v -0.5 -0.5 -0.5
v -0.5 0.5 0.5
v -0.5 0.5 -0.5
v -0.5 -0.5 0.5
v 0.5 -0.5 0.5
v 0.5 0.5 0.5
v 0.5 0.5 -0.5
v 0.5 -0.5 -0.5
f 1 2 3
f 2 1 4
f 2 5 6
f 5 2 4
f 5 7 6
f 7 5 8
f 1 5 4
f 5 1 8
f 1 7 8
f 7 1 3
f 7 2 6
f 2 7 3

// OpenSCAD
// file: polychannel.scad
module shape3D(size, position, center=true) {
    translate(position) cube(size, center=center);
}

// See https://forum.openscad.org/Calculating-Summarize-Arrays-generate-Array-td29132.html
function partial_sum(v, n, r = 0) = n <= 0 
        ? r + v[0] 
        : partial_sum(v, n - 1, r + v[n]); 

function partial_sum_vectors(v, n, r = [0,0,0]) = partial_sum(v, n, r); 

/*
// Tests for partial_sum and partial_sum_vectors
dim = [10, 8, 2, 25, 5]; 
n = len(dim); 
x_pos = [for(i = [0:n-1]) partial_sum(dim, i)]; 
echo(x_pos); // ECHO: [10, 18, 20, 45, 50] 
echo("");
dim2 = [[10, 1], [8, 1], [2, 1], [25, 1], [5, 2]]; 
n2 = len(dim2); 
x_pos2 = [for(i = [0:n2-1]) partial_sum_vectors(dim2, i)]; 
echo(x_pos2); // ECHO: [[10, 1], [18, 2], [20, 3], [45, 4], [50, 6]]
echo("");
x_pos3 = [for(i = [0:n2-1]) partial_sum(dim2, i, [0,0,0])]; 
echo(x_pos3); // ECHO: [[10, 1], [18, 2], [20, 3], [45, 4], [50, 6]]
echo("");
*/

module polychannel_absolute_positions(sizes, positions, clr="lightblue", center=true, show_only_shapes=false) {
    if (show_only_shapes) {
        for (i = [0:len(sizes)-1]) {
            color(clr) shape3D(sizes[i], positions[i]);
        }
    } else {
        for (i = [1:len(sizes)-1]) {
            color(clr) hull() {
                shape3D(sizes[i-1], positions[i-1]);
                shape3D(sizes[i], positions[i]);
            };
        };
    }
}

module polychannel(sizes, positions=[], relative_positions=false, clr="lightblue", center=true, show_only_shapes=false) {
    if (relative_positions) {
        absolute_positions = [for(i = [0:len(sizes)-1]) partial_sum_vectors(positions, i)];
        polychannel_absolute_positions(sizes, absolute_positions, clr=clr, center=center, show_only_shapes=show_only_shapes);
    } else {
        polychannel_absolute_positions(sizes, positions, clr=clr, center=center, show_only_shapes=show_only_shapes);
    }
}


size1 = [1, 1, 1];

sizes = [
    size1,
    [0.1, 1, 1],
    5 * size1,
    [2, 0.1, 2],
    2 * size1,
    2 * size1,
    size1,
    size1,
    size1
];
positions = [
    [0, 0, 0],
    [10, 0, 0],
    [20, 0, 0],
    [20, 8, 0],
    [20, 15, 0],
    [20, 15, 10],
    [16, 15, 9.5],
    [8, 15, 2],
    [0, 15, 2]
];
relative_positions = [
    [0, 0, 0],  // All subsequent positions are relative to this position
    [10, 0, 0],
    [10, 0, 0],
    [0, 8, 0],
    [0, 7, 0],
    [0, 0, 10],
    [-4, 0, -0.5],
    [-8, 0, -7.5],
    [-8, 0, 0]
];

polychannel(sizes, positions, clr="red", show_only_shapes=true);

translate([0, -25, 0]) polychannel(sizes, positions, clr="Salmon");

translate([0, 25, 0]) polychannel(sizes, relative_positions, relative_positions=true);
// main file
use <polychannel.scad>

eps = 0.01;
params_pos_relative = [
    ["sphr", [eps, 4, 4], [0, 0, 0], [0, [0, 0, 1]]],
    ["sphr", [eps, 4, 4], [7, 0, 0], [0, [0, 0, 1]]],
    ["sphr", [eps, 3, 3], [0, 0, 0], [0, [0, 0, 1]]],
    ["cube", [eps, 0.5, 0.5], [3, 0, 0], [0, [0, 0, 1]]],
    ["cube", [0.5, 0.5, 0.5], [5, 0, 0], [0, [0, 0, 1]]],
    ["cube", [0.5, 0.5, 0.5], [0, 4, 0], [0, [0, 0, 1]]],
];
polychannel(params_pos_relative);
